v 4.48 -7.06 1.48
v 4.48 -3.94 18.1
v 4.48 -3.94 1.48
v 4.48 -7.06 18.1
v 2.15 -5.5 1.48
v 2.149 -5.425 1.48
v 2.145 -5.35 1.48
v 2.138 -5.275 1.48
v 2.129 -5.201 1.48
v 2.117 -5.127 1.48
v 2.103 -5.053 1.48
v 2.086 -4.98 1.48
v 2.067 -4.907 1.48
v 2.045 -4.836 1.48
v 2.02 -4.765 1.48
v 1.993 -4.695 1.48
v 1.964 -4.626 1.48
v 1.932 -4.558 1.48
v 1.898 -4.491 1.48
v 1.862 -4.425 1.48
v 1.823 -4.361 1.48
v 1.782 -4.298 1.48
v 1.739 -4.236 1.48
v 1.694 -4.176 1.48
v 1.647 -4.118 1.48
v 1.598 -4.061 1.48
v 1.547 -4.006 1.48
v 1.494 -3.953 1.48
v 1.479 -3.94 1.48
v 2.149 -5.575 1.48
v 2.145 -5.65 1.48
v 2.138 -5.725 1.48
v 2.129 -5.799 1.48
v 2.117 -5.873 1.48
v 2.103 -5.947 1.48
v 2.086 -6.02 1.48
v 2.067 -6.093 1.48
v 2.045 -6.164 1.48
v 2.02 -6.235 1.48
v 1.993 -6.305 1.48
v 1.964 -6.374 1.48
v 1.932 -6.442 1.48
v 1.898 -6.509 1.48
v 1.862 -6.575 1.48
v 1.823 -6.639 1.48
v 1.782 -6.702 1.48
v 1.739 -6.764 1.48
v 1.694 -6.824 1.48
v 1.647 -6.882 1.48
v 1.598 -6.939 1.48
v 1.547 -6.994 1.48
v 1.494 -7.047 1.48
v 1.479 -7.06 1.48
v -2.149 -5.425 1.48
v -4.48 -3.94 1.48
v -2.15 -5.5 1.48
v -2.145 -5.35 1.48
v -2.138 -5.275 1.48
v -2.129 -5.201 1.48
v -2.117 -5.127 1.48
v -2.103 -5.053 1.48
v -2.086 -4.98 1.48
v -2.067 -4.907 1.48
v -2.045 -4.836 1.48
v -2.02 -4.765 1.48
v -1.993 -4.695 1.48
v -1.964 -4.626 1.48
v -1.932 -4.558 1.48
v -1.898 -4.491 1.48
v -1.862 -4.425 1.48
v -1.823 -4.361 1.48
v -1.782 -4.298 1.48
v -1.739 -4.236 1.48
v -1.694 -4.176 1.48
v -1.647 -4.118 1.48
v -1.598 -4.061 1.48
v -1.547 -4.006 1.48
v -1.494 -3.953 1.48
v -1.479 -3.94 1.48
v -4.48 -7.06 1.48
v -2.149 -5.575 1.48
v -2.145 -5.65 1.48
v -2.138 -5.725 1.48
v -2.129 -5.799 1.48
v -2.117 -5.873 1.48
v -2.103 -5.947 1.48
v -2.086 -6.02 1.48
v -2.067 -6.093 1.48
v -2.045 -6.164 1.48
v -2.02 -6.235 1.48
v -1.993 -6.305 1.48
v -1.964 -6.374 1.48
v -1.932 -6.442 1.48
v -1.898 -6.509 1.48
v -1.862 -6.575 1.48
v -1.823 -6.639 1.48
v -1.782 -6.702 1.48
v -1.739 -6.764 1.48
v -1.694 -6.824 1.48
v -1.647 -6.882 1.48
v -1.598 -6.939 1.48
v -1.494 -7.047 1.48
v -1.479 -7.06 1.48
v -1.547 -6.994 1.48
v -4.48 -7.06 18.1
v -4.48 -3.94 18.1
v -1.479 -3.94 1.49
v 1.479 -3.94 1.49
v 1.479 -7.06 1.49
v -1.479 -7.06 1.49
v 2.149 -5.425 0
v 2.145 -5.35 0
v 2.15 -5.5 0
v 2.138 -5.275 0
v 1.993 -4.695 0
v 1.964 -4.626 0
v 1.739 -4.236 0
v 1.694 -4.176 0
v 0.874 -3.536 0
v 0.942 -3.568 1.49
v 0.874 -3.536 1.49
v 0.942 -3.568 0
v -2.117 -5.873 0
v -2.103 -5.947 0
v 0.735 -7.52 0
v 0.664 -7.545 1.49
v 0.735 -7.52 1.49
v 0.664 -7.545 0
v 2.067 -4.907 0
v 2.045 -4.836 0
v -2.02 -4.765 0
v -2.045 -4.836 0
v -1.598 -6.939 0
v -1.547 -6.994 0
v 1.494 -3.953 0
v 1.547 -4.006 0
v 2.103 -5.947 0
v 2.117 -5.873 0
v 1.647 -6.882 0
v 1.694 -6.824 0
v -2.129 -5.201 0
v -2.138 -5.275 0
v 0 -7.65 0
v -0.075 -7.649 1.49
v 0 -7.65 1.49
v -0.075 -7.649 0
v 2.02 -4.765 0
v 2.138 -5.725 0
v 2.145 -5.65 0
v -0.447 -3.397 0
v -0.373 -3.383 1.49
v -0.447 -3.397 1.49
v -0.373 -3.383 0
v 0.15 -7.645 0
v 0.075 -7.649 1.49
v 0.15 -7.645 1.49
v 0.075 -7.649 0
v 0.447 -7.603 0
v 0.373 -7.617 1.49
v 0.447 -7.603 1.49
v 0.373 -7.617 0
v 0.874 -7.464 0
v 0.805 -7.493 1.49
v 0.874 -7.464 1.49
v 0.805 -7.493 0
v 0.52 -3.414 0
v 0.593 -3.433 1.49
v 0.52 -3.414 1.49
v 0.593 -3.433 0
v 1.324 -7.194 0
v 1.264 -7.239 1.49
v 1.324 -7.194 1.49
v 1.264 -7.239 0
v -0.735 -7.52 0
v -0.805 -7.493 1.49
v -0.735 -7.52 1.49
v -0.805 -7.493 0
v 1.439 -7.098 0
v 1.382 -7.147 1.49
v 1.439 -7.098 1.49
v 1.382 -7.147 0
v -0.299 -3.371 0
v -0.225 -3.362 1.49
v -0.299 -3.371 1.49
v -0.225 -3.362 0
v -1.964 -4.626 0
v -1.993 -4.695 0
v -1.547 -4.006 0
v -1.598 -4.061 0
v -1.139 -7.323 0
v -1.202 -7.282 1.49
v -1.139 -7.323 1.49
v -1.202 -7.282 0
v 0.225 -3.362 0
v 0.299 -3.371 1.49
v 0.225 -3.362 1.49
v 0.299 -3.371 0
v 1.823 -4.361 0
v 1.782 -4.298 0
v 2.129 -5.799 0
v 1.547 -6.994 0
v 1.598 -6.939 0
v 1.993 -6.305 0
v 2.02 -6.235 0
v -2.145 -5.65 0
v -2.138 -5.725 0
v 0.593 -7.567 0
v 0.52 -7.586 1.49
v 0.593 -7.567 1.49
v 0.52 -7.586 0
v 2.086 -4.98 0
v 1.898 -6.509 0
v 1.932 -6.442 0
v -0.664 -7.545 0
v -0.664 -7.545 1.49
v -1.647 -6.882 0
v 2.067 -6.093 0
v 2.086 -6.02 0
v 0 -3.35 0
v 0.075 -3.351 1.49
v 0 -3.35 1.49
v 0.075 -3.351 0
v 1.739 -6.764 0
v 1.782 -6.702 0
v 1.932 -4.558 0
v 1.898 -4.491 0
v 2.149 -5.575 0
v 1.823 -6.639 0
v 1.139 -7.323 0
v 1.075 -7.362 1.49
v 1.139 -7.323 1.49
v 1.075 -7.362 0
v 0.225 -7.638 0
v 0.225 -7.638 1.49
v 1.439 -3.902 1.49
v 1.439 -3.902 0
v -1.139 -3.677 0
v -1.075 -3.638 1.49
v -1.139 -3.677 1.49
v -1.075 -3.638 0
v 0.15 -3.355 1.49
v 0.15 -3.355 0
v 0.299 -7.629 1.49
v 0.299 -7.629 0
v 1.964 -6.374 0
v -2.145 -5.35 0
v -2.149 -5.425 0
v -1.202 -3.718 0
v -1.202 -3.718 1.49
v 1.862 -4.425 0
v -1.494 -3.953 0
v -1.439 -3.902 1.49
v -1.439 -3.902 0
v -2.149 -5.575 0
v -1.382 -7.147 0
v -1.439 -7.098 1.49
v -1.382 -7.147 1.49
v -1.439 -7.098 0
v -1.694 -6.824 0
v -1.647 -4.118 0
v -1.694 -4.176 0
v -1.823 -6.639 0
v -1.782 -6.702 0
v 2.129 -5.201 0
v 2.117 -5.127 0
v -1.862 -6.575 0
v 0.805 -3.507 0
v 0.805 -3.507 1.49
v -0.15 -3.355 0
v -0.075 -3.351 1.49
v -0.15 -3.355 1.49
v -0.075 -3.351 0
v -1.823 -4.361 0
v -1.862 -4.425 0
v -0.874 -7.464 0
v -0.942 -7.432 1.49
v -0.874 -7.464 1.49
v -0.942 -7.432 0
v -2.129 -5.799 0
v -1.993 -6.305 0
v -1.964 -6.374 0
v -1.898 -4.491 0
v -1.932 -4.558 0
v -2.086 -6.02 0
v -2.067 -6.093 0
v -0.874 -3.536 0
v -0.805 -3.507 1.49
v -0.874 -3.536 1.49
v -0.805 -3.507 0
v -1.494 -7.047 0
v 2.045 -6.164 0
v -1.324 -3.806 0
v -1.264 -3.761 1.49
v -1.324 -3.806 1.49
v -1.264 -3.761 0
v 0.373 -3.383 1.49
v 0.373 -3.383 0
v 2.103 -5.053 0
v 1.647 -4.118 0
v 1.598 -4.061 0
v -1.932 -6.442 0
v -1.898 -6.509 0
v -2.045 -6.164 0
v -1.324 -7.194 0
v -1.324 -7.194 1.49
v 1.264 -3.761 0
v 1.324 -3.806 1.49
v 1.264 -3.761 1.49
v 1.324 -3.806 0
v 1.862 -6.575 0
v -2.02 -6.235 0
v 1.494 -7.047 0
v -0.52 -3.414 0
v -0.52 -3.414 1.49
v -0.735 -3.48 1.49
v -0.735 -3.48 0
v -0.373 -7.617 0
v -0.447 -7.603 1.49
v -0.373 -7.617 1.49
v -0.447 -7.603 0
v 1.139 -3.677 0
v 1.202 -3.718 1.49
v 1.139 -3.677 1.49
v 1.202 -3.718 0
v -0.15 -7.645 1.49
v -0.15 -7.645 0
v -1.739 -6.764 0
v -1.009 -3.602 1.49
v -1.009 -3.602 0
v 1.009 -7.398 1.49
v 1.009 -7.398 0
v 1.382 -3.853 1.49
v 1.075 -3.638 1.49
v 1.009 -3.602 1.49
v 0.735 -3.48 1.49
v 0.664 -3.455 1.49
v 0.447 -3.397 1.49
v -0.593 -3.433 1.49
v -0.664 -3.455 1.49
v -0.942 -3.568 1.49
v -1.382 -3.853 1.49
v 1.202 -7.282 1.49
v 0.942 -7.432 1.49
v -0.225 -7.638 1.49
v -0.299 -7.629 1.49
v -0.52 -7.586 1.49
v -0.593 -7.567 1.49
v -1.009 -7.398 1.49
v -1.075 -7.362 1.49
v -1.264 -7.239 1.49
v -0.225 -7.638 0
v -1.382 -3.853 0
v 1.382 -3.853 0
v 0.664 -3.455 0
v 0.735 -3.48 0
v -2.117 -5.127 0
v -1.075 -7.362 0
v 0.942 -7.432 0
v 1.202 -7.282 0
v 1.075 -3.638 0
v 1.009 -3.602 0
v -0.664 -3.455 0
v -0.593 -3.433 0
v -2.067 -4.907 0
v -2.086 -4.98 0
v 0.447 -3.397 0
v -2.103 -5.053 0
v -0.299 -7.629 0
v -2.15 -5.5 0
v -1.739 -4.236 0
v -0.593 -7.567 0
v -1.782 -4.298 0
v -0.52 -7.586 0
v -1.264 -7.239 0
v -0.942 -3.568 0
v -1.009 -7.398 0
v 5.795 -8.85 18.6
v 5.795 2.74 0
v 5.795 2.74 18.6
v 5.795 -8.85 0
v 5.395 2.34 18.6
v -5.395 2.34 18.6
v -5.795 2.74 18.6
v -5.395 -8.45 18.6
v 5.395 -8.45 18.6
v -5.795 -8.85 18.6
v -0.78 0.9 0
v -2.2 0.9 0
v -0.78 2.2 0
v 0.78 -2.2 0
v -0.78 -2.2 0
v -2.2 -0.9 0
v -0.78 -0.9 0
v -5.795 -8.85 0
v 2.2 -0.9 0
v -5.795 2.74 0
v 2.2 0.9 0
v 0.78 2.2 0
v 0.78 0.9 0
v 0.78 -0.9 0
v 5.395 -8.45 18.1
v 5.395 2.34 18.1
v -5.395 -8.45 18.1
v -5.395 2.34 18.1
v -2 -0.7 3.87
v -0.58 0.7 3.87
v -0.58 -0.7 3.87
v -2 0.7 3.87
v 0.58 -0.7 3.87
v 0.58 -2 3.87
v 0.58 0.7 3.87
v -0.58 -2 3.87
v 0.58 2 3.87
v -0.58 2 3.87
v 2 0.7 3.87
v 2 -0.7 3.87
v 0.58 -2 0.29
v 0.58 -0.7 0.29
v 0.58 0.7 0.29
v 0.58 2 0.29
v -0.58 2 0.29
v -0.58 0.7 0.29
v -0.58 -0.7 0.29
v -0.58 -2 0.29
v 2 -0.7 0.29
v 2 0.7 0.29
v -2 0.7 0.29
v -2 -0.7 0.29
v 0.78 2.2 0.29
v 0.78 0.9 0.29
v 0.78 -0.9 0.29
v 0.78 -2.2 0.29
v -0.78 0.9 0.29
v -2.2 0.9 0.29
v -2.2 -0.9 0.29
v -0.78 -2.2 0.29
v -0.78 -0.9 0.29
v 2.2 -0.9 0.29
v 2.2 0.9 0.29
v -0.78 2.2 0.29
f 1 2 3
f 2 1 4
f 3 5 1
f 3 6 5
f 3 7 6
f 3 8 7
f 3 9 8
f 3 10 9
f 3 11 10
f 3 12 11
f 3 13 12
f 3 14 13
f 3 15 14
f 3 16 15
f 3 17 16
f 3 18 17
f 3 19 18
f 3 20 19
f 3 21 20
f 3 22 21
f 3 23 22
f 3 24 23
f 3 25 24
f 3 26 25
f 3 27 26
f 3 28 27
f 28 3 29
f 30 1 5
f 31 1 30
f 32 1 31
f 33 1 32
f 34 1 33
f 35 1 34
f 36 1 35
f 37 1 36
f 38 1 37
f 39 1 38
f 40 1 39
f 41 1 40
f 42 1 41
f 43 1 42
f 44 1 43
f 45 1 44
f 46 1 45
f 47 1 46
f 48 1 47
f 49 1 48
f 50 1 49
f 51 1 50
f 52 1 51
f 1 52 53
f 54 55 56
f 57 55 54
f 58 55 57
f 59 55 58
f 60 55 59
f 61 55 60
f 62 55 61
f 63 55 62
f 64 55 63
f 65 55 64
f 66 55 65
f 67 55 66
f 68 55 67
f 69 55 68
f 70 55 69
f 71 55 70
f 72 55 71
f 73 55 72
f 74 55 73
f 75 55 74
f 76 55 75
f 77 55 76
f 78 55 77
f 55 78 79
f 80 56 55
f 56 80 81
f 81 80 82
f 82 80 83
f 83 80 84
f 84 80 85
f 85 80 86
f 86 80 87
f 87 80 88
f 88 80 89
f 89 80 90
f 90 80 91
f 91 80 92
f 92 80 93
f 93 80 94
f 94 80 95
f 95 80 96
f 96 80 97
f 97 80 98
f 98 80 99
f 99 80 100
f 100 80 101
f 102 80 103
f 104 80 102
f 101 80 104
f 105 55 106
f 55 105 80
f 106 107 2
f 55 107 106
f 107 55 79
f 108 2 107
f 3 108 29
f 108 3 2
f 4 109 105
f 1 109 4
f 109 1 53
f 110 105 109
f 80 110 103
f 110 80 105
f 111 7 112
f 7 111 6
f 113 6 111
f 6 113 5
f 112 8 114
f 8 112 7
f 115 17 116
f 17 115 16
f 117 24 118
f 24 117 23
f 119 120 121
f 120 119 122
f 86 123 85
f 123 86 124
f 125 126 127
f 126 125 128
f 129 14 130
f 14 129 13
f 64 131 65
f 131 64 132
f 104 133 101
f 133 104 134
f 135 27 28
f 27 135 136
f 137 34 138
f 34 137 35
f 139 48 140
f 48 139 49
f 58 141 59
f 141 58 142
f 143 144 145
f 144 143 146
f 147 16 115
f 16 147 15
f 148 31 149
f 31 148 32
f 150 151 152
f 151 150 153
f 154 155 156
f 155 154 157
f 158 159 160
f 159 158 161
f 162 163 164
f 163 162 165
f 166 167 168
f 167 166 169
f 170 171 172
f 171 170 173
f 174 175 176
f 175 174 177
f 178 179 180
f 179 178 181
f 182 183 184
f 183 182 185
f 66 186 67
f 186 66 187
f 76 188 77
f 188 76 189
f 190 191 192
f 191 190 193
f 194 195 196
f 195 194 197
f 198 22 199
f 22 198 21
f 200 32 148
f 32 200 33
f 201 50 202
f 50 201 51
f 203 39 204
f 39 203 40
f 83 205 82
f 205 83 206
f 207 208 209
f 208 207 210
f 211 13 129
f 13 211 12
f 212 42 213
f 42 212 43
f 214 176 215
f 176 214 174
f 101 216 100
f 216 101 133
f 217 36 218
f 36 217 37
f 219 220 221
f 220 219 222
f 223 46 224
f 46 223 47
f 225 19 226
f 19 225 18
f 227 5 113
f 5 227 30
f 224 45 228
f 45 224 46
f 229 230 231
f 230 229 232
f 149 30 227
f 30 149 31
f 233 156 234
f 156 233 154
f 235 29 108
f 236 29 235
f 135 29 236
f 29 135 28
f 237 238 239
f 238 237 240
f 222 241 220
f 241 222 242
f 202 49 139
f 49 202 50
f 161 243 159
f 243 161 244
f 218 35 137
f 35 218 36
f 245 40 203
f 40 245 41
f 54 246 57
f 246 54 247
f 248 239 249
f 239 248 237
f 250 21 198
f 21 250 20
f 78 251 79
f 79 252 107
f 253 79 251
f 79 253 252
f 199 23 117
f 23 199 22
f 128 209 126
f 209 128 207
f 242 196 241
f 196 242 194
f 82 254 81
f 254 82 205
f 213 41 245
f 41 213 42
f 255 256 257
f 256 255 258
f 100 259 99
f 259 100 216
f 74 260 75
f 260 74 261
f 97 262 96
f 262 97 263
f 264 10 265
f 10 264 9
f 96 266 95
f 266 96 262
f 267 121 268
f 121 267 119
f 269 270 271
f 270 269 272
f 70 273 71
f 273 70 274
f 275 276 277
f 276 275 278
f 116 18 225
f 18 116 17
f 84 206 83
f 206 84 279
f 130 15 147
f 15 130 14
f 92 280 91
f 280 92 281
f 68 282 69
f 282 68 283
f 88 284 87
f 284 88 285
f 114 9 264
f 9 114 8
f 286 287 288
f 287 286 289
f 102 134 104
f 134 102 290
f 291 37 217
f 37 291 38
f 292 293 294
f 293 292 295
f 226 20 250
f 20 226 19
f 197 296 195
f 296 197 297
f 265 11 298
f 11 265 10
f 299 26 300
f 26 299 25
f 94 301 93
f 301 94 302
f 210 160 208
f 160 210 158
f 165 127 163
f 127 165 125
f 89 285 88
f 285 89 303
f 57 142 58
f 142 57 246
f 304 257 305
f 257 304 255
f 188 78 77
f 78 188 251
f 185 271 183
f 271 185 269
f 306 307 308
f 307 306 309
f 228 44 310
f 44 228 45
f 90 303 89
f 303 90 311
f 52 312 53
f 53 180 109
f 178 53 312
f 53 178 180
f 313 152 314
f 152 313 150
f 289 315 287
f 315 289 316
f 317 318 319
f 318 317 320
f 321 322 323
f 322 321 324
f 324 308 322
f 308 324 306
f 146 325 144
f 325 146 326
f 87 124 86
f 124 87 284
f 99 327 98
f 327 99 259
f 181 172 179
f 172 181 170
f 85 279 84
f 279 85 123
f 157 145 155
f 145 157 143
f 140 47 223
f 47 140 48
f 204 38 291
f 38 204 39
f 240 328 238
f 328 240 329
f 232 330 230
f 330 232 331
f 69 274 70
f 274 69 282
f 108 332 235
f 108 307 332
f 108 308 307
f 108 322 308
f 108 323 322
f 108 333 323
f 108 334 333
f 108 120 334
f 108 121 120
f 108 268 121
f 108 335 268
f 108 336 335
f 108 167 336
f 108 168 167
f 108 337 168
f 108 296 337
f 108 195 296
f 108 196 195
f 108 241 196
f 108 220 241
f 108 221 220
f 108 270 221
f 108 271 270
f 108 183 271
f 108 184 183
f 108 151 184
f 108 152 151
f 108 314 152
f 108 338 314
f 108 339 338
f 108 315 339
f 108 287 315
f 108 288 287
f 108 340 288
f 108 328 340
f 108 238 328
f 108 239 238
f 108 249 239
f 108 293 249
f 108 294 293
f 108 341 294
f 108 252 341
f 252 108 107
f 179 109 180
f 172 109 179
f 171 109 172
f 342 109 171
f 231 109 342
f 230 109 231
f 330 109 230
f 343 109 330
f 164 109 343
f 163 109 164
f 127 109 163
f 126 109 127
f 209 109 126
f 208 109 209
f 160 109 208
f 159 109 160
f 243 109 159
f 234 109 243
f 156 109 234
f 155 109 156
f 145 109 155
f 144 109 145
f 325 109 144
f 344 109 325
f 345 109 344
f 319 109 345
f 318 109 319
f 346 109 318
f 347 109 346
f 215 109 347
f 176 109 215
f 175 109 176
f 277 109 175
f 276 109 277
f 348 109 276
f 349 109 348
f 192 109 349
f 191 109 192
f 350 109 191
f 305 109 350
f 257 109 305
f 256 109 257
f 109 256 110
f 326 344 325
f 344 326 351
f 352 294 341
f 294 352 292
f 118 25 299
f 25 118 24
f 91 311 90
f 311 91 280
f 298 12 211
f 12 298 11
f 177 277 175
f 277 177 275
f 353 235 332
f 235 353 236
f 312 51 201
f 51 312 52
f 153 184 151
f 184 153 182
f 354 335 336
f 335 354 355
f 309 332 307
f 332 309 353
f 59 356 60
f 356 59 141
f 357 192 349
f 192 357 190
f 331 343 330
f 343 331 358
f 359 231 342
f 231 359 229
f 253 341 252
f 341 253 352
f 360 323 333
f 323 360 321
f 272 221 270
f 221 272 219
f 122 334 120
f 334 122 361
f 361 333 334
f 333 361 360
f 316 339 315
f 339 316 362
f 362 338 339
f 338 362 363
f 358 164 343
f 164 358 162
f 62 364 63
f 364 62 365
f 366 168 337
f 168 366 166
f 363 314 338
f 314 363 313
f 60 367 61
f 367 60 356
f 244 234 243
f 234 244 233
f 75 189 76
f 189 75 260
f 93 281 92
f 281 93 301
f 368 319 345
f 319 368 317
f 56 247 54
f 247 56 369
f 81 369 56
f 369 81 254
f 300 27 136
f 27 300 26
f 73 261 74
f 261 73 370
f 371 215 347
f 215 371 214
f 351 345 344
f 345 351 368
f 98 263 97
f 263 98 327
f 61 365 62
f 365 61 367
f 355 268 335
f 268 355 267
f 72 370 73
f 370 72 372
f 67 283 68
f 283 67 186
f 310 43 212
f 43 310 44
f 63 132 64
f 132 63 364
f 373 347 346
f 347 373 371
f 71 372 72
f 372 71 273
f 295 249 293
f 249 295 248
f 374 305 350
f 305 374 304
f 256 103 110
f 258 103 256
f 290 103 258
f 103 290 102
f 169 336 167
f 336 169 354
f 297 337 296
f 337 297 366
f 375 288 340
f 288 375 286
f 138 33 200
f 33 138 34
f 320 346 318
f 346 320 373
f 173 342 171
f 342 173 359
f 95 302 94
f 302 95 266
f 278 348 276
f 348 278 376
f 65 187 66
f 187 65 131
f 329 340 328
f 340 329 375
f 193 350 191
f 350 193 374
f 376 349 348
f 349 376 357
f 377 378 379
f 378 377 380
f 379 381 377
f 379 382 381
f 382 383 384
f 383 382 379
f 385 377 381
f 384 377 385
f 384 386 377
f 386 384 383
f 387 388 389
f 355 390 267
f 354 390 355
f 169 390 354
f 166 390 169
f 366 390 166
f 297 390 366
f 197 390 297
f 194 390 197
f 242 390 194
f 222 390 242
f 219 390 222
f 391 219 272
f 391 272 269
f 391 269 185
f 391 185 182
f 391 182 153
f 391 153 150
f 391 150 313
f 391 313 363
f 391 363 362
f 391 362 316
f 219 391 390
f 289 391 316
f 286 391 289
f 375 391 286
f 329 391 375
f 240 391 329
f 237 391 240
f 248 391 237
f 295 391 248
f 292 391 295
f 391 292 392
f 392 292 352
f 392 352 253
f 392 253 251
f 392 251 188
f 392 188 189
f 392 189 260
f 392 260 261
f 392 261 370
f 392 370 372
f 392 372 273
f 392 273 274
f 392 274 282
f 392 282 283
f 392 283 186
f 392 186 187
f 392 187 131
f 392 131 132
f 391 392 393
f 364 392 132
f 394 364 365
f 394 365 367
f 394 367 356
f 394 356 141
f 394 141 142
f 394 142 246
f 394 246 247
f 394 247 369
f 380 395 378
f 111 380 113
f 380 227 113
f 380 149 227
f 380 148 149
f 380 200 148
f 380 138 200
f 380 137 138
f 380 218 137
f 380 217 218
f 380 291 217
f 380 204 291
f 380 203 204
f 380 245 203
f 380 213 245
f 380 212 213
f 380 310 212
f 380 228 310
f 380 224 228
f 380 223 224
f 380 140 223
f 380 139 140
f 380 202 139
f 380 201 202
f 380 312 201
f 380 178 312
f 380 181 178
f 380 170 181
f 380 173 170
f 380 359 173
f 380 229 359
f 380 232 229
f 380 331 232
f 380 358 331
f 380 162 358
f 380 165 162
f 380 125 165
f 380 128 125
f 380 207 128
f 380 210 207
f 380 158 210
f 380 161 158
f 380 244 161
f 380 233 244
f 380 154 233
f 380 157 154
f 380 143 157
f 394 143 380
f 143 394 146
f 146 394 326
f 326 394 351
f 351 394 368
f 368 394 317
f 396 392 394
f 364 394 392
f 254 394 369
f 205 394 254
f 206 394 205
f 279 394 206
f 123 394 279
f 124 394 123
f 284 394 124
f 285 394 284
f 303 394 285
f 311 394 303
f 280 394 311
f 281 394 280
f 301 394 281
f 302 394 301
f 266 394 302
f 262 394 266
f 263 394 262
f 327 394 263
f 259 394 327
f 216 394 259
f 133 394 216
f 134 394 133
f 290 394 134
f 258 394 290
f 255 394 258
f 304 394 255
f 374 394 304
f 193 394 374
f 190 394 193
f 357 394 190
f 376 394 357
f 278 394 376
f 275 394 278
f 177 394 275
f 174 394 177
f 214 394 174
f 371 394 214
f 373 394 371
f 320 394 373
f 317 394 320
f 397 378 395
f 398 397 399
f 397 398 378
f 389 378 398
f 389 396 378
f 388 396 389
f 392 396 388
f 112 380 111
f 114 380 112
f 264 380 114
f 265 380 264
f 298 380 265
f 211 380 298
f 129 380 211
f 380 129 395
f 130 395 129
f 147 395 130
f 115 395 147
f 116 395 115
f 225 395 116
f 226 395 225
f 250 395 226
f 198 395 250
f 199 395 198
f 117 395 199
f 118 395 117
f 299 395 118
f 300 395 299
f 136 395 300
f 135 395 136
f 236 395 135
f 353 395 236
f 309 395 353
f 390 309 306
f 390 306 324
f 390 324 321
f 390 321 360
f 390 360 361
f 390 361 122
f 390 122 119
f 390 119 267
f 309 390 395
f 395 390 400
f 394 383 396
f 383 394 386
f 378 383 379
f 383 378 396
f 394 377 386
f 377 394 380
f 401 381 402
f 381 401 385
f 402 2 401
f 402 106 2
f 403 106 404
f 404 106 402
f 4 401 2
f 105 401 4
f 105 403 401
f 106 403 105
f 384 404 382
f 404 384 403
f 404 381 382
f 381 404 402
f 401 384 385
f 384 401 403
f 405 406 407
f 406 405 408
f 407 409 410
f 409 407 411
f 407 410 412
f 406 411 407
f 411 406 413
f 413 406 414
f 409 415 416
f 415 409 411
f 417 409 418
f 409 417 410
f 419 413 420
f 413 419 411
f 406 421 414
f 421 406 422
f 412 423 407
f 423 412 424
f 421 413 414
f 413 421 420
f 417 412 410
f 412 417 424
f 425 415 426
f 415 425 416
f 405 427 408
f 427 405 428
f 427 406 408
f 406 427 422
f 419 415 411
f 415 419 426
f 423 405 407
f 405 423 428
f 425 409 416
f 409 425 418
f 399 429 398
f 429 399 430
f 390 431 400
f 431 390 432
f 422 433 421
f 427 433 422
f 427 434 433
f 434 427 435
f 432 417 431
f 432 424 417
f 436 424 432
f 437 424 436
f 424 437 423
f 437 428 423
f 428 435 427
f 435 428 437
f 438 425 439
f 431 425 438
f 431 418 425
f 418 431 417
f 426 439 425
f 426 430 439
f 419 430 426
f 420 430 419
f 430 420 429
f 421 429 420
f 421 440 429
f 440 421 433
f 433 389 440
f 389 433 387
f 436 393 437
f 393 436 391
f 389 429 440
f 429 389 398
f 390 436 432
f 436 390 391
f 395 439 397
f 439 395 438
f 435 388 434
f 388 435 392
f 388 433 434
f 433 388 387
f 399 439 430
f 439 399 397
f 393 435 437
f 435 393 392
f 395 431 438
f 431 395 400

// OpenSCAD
// file: cherry-female.scad
$fn=180;
eps=0.01;

// Params Cherry mate
cherry_thick1=1.16;
cherry_thick2=1.40;
cherry_wide=4.00;
cherry_high=3.90;
//shaft_high=5.00;
shaft_high=cherry_high+0.3;
shaft_wide=6.80;
shaft_deep=5.20;
fudge_high=0.30;
fudge_plus=0.40;

// Cherry mate
difference() {
    // base body
    translate([0, 0, shaft_high/2]) cube([shaft_wide, shaft_deep, shaft_high], center=true);
    // cherry splines
    translate([0, 0, cherry_high/2-eps]) 
        cube([cherry_thick1, cherry_wide, cherry_high], center=true); 
    translate([0, 0, cherry_high/2-eps]) 
        cube([cherry_wide, cherry_thick2, cherry_high], center=true); 
    // fudge bottom layer
    translate([0, 0, fudge_high/2-eps]) 
        cube([cherry_thick1+fudge_plus, cherry_wide+fudge_plus, fudge_high], center=true); 
    translate([0, 0, fudge_high/2-eps]) 
        cube([cherry_wide+fudge_plus, cherry_thick2+fudge_plus, fudge_high], center=true);
    
    
    // debug
    //translate([0, 0, -0.01]) cube(90);
}
// main file
$fn=180;
eps=0.01;

// keycap model
// 0 is fcu square
// 1 is smaller rect
// 2 is big warn square
// 3 is small TO config
kmod=0;

// Params key cap
kc_tall=18.60; // 17.00 for all except fcu panel is 18.60
kc_high=[11.59, 7.75, 19.00, 7.75];
kc_wide=[11.59, 11.59, 19.00, 11.59];
led_high=[3.12, 3.12, 9.00, 0];
led_wide=[8.96, 8.96, 13.00, 0];
led_x=(kc_wide[kmod]-led_wide[kmod])/2;
//led_y=[1.79, 1.25, 4.50, 0];
led_y=[1.79, 0.75, 5.0, 0];
led_flange_high=1.50;
led_flange_rad=4.30/2;
top_to_sw_center=[8.85, 8.31, 16.40, 8.31];
well_wall_thick=0.40;
well_depth=0.50;

translate([-kc_wide[kmod]/2, -top_to_sw_center[kmod], 0]) {
    // Debug label insert
//    translate([well_wall_thick, well_wall_thick, kc_tall-well_depth]) 
//        color("red", 0.2)
//            cube([kc_wide[kmod]-well_wall_thick*2, kc_high[kmod]-well_wall_thick*2, well_depth]);
//    echo(kc_wide[kmod]-well_wall_thick*2, kc_high[kmod]-well_wall_thick*2);
    
    difference() {
        // keycap body
        union() {
            cube([kc_wide[kmod], kc_high[kmod], kc_tall]);
        }
        // Debug
        //translate([kc_wide[kmod]/2, -eps, -eps]) cube(99);
        // led cavity
        if (led_y[kmod] > 0) {
            translate([led_x, led_y[kmod], led_flange_high-eps*2]) cube([led_wide[kmod], led_high[kmod], 99]);
            translate([kc_wide[kmod]/2, led_y[kmod]+led_high[kmod]/2, -eps]) cylinder(led_flange_high, led_flange_rad, led_flange_rad);
        }
        // top well cavity
        translate([well_wall_thick, well_wall_thick, kc_tall-well_depth])
            cube([kc_wide[kmod]-well_wall_thick*2, kc_high[kmod]-well_wall_thick*2, 99]);
        // key mate cavity
        translate([kc_wide[kmod]/2, top_to_sw_center[kmod], -eps])
            cylinder(3.88, 2.5, 2.5);
    }
}

// fix thin wall near led
if (kmod == 1) {
    translate([-2.5, -top_to_sw_center[kmod]-0.8+eps, 0]) cube([5, 0.8, led_flange_high+0.5]);
}

// key mate
union() {
    include <cherry-female.scad>;
}
